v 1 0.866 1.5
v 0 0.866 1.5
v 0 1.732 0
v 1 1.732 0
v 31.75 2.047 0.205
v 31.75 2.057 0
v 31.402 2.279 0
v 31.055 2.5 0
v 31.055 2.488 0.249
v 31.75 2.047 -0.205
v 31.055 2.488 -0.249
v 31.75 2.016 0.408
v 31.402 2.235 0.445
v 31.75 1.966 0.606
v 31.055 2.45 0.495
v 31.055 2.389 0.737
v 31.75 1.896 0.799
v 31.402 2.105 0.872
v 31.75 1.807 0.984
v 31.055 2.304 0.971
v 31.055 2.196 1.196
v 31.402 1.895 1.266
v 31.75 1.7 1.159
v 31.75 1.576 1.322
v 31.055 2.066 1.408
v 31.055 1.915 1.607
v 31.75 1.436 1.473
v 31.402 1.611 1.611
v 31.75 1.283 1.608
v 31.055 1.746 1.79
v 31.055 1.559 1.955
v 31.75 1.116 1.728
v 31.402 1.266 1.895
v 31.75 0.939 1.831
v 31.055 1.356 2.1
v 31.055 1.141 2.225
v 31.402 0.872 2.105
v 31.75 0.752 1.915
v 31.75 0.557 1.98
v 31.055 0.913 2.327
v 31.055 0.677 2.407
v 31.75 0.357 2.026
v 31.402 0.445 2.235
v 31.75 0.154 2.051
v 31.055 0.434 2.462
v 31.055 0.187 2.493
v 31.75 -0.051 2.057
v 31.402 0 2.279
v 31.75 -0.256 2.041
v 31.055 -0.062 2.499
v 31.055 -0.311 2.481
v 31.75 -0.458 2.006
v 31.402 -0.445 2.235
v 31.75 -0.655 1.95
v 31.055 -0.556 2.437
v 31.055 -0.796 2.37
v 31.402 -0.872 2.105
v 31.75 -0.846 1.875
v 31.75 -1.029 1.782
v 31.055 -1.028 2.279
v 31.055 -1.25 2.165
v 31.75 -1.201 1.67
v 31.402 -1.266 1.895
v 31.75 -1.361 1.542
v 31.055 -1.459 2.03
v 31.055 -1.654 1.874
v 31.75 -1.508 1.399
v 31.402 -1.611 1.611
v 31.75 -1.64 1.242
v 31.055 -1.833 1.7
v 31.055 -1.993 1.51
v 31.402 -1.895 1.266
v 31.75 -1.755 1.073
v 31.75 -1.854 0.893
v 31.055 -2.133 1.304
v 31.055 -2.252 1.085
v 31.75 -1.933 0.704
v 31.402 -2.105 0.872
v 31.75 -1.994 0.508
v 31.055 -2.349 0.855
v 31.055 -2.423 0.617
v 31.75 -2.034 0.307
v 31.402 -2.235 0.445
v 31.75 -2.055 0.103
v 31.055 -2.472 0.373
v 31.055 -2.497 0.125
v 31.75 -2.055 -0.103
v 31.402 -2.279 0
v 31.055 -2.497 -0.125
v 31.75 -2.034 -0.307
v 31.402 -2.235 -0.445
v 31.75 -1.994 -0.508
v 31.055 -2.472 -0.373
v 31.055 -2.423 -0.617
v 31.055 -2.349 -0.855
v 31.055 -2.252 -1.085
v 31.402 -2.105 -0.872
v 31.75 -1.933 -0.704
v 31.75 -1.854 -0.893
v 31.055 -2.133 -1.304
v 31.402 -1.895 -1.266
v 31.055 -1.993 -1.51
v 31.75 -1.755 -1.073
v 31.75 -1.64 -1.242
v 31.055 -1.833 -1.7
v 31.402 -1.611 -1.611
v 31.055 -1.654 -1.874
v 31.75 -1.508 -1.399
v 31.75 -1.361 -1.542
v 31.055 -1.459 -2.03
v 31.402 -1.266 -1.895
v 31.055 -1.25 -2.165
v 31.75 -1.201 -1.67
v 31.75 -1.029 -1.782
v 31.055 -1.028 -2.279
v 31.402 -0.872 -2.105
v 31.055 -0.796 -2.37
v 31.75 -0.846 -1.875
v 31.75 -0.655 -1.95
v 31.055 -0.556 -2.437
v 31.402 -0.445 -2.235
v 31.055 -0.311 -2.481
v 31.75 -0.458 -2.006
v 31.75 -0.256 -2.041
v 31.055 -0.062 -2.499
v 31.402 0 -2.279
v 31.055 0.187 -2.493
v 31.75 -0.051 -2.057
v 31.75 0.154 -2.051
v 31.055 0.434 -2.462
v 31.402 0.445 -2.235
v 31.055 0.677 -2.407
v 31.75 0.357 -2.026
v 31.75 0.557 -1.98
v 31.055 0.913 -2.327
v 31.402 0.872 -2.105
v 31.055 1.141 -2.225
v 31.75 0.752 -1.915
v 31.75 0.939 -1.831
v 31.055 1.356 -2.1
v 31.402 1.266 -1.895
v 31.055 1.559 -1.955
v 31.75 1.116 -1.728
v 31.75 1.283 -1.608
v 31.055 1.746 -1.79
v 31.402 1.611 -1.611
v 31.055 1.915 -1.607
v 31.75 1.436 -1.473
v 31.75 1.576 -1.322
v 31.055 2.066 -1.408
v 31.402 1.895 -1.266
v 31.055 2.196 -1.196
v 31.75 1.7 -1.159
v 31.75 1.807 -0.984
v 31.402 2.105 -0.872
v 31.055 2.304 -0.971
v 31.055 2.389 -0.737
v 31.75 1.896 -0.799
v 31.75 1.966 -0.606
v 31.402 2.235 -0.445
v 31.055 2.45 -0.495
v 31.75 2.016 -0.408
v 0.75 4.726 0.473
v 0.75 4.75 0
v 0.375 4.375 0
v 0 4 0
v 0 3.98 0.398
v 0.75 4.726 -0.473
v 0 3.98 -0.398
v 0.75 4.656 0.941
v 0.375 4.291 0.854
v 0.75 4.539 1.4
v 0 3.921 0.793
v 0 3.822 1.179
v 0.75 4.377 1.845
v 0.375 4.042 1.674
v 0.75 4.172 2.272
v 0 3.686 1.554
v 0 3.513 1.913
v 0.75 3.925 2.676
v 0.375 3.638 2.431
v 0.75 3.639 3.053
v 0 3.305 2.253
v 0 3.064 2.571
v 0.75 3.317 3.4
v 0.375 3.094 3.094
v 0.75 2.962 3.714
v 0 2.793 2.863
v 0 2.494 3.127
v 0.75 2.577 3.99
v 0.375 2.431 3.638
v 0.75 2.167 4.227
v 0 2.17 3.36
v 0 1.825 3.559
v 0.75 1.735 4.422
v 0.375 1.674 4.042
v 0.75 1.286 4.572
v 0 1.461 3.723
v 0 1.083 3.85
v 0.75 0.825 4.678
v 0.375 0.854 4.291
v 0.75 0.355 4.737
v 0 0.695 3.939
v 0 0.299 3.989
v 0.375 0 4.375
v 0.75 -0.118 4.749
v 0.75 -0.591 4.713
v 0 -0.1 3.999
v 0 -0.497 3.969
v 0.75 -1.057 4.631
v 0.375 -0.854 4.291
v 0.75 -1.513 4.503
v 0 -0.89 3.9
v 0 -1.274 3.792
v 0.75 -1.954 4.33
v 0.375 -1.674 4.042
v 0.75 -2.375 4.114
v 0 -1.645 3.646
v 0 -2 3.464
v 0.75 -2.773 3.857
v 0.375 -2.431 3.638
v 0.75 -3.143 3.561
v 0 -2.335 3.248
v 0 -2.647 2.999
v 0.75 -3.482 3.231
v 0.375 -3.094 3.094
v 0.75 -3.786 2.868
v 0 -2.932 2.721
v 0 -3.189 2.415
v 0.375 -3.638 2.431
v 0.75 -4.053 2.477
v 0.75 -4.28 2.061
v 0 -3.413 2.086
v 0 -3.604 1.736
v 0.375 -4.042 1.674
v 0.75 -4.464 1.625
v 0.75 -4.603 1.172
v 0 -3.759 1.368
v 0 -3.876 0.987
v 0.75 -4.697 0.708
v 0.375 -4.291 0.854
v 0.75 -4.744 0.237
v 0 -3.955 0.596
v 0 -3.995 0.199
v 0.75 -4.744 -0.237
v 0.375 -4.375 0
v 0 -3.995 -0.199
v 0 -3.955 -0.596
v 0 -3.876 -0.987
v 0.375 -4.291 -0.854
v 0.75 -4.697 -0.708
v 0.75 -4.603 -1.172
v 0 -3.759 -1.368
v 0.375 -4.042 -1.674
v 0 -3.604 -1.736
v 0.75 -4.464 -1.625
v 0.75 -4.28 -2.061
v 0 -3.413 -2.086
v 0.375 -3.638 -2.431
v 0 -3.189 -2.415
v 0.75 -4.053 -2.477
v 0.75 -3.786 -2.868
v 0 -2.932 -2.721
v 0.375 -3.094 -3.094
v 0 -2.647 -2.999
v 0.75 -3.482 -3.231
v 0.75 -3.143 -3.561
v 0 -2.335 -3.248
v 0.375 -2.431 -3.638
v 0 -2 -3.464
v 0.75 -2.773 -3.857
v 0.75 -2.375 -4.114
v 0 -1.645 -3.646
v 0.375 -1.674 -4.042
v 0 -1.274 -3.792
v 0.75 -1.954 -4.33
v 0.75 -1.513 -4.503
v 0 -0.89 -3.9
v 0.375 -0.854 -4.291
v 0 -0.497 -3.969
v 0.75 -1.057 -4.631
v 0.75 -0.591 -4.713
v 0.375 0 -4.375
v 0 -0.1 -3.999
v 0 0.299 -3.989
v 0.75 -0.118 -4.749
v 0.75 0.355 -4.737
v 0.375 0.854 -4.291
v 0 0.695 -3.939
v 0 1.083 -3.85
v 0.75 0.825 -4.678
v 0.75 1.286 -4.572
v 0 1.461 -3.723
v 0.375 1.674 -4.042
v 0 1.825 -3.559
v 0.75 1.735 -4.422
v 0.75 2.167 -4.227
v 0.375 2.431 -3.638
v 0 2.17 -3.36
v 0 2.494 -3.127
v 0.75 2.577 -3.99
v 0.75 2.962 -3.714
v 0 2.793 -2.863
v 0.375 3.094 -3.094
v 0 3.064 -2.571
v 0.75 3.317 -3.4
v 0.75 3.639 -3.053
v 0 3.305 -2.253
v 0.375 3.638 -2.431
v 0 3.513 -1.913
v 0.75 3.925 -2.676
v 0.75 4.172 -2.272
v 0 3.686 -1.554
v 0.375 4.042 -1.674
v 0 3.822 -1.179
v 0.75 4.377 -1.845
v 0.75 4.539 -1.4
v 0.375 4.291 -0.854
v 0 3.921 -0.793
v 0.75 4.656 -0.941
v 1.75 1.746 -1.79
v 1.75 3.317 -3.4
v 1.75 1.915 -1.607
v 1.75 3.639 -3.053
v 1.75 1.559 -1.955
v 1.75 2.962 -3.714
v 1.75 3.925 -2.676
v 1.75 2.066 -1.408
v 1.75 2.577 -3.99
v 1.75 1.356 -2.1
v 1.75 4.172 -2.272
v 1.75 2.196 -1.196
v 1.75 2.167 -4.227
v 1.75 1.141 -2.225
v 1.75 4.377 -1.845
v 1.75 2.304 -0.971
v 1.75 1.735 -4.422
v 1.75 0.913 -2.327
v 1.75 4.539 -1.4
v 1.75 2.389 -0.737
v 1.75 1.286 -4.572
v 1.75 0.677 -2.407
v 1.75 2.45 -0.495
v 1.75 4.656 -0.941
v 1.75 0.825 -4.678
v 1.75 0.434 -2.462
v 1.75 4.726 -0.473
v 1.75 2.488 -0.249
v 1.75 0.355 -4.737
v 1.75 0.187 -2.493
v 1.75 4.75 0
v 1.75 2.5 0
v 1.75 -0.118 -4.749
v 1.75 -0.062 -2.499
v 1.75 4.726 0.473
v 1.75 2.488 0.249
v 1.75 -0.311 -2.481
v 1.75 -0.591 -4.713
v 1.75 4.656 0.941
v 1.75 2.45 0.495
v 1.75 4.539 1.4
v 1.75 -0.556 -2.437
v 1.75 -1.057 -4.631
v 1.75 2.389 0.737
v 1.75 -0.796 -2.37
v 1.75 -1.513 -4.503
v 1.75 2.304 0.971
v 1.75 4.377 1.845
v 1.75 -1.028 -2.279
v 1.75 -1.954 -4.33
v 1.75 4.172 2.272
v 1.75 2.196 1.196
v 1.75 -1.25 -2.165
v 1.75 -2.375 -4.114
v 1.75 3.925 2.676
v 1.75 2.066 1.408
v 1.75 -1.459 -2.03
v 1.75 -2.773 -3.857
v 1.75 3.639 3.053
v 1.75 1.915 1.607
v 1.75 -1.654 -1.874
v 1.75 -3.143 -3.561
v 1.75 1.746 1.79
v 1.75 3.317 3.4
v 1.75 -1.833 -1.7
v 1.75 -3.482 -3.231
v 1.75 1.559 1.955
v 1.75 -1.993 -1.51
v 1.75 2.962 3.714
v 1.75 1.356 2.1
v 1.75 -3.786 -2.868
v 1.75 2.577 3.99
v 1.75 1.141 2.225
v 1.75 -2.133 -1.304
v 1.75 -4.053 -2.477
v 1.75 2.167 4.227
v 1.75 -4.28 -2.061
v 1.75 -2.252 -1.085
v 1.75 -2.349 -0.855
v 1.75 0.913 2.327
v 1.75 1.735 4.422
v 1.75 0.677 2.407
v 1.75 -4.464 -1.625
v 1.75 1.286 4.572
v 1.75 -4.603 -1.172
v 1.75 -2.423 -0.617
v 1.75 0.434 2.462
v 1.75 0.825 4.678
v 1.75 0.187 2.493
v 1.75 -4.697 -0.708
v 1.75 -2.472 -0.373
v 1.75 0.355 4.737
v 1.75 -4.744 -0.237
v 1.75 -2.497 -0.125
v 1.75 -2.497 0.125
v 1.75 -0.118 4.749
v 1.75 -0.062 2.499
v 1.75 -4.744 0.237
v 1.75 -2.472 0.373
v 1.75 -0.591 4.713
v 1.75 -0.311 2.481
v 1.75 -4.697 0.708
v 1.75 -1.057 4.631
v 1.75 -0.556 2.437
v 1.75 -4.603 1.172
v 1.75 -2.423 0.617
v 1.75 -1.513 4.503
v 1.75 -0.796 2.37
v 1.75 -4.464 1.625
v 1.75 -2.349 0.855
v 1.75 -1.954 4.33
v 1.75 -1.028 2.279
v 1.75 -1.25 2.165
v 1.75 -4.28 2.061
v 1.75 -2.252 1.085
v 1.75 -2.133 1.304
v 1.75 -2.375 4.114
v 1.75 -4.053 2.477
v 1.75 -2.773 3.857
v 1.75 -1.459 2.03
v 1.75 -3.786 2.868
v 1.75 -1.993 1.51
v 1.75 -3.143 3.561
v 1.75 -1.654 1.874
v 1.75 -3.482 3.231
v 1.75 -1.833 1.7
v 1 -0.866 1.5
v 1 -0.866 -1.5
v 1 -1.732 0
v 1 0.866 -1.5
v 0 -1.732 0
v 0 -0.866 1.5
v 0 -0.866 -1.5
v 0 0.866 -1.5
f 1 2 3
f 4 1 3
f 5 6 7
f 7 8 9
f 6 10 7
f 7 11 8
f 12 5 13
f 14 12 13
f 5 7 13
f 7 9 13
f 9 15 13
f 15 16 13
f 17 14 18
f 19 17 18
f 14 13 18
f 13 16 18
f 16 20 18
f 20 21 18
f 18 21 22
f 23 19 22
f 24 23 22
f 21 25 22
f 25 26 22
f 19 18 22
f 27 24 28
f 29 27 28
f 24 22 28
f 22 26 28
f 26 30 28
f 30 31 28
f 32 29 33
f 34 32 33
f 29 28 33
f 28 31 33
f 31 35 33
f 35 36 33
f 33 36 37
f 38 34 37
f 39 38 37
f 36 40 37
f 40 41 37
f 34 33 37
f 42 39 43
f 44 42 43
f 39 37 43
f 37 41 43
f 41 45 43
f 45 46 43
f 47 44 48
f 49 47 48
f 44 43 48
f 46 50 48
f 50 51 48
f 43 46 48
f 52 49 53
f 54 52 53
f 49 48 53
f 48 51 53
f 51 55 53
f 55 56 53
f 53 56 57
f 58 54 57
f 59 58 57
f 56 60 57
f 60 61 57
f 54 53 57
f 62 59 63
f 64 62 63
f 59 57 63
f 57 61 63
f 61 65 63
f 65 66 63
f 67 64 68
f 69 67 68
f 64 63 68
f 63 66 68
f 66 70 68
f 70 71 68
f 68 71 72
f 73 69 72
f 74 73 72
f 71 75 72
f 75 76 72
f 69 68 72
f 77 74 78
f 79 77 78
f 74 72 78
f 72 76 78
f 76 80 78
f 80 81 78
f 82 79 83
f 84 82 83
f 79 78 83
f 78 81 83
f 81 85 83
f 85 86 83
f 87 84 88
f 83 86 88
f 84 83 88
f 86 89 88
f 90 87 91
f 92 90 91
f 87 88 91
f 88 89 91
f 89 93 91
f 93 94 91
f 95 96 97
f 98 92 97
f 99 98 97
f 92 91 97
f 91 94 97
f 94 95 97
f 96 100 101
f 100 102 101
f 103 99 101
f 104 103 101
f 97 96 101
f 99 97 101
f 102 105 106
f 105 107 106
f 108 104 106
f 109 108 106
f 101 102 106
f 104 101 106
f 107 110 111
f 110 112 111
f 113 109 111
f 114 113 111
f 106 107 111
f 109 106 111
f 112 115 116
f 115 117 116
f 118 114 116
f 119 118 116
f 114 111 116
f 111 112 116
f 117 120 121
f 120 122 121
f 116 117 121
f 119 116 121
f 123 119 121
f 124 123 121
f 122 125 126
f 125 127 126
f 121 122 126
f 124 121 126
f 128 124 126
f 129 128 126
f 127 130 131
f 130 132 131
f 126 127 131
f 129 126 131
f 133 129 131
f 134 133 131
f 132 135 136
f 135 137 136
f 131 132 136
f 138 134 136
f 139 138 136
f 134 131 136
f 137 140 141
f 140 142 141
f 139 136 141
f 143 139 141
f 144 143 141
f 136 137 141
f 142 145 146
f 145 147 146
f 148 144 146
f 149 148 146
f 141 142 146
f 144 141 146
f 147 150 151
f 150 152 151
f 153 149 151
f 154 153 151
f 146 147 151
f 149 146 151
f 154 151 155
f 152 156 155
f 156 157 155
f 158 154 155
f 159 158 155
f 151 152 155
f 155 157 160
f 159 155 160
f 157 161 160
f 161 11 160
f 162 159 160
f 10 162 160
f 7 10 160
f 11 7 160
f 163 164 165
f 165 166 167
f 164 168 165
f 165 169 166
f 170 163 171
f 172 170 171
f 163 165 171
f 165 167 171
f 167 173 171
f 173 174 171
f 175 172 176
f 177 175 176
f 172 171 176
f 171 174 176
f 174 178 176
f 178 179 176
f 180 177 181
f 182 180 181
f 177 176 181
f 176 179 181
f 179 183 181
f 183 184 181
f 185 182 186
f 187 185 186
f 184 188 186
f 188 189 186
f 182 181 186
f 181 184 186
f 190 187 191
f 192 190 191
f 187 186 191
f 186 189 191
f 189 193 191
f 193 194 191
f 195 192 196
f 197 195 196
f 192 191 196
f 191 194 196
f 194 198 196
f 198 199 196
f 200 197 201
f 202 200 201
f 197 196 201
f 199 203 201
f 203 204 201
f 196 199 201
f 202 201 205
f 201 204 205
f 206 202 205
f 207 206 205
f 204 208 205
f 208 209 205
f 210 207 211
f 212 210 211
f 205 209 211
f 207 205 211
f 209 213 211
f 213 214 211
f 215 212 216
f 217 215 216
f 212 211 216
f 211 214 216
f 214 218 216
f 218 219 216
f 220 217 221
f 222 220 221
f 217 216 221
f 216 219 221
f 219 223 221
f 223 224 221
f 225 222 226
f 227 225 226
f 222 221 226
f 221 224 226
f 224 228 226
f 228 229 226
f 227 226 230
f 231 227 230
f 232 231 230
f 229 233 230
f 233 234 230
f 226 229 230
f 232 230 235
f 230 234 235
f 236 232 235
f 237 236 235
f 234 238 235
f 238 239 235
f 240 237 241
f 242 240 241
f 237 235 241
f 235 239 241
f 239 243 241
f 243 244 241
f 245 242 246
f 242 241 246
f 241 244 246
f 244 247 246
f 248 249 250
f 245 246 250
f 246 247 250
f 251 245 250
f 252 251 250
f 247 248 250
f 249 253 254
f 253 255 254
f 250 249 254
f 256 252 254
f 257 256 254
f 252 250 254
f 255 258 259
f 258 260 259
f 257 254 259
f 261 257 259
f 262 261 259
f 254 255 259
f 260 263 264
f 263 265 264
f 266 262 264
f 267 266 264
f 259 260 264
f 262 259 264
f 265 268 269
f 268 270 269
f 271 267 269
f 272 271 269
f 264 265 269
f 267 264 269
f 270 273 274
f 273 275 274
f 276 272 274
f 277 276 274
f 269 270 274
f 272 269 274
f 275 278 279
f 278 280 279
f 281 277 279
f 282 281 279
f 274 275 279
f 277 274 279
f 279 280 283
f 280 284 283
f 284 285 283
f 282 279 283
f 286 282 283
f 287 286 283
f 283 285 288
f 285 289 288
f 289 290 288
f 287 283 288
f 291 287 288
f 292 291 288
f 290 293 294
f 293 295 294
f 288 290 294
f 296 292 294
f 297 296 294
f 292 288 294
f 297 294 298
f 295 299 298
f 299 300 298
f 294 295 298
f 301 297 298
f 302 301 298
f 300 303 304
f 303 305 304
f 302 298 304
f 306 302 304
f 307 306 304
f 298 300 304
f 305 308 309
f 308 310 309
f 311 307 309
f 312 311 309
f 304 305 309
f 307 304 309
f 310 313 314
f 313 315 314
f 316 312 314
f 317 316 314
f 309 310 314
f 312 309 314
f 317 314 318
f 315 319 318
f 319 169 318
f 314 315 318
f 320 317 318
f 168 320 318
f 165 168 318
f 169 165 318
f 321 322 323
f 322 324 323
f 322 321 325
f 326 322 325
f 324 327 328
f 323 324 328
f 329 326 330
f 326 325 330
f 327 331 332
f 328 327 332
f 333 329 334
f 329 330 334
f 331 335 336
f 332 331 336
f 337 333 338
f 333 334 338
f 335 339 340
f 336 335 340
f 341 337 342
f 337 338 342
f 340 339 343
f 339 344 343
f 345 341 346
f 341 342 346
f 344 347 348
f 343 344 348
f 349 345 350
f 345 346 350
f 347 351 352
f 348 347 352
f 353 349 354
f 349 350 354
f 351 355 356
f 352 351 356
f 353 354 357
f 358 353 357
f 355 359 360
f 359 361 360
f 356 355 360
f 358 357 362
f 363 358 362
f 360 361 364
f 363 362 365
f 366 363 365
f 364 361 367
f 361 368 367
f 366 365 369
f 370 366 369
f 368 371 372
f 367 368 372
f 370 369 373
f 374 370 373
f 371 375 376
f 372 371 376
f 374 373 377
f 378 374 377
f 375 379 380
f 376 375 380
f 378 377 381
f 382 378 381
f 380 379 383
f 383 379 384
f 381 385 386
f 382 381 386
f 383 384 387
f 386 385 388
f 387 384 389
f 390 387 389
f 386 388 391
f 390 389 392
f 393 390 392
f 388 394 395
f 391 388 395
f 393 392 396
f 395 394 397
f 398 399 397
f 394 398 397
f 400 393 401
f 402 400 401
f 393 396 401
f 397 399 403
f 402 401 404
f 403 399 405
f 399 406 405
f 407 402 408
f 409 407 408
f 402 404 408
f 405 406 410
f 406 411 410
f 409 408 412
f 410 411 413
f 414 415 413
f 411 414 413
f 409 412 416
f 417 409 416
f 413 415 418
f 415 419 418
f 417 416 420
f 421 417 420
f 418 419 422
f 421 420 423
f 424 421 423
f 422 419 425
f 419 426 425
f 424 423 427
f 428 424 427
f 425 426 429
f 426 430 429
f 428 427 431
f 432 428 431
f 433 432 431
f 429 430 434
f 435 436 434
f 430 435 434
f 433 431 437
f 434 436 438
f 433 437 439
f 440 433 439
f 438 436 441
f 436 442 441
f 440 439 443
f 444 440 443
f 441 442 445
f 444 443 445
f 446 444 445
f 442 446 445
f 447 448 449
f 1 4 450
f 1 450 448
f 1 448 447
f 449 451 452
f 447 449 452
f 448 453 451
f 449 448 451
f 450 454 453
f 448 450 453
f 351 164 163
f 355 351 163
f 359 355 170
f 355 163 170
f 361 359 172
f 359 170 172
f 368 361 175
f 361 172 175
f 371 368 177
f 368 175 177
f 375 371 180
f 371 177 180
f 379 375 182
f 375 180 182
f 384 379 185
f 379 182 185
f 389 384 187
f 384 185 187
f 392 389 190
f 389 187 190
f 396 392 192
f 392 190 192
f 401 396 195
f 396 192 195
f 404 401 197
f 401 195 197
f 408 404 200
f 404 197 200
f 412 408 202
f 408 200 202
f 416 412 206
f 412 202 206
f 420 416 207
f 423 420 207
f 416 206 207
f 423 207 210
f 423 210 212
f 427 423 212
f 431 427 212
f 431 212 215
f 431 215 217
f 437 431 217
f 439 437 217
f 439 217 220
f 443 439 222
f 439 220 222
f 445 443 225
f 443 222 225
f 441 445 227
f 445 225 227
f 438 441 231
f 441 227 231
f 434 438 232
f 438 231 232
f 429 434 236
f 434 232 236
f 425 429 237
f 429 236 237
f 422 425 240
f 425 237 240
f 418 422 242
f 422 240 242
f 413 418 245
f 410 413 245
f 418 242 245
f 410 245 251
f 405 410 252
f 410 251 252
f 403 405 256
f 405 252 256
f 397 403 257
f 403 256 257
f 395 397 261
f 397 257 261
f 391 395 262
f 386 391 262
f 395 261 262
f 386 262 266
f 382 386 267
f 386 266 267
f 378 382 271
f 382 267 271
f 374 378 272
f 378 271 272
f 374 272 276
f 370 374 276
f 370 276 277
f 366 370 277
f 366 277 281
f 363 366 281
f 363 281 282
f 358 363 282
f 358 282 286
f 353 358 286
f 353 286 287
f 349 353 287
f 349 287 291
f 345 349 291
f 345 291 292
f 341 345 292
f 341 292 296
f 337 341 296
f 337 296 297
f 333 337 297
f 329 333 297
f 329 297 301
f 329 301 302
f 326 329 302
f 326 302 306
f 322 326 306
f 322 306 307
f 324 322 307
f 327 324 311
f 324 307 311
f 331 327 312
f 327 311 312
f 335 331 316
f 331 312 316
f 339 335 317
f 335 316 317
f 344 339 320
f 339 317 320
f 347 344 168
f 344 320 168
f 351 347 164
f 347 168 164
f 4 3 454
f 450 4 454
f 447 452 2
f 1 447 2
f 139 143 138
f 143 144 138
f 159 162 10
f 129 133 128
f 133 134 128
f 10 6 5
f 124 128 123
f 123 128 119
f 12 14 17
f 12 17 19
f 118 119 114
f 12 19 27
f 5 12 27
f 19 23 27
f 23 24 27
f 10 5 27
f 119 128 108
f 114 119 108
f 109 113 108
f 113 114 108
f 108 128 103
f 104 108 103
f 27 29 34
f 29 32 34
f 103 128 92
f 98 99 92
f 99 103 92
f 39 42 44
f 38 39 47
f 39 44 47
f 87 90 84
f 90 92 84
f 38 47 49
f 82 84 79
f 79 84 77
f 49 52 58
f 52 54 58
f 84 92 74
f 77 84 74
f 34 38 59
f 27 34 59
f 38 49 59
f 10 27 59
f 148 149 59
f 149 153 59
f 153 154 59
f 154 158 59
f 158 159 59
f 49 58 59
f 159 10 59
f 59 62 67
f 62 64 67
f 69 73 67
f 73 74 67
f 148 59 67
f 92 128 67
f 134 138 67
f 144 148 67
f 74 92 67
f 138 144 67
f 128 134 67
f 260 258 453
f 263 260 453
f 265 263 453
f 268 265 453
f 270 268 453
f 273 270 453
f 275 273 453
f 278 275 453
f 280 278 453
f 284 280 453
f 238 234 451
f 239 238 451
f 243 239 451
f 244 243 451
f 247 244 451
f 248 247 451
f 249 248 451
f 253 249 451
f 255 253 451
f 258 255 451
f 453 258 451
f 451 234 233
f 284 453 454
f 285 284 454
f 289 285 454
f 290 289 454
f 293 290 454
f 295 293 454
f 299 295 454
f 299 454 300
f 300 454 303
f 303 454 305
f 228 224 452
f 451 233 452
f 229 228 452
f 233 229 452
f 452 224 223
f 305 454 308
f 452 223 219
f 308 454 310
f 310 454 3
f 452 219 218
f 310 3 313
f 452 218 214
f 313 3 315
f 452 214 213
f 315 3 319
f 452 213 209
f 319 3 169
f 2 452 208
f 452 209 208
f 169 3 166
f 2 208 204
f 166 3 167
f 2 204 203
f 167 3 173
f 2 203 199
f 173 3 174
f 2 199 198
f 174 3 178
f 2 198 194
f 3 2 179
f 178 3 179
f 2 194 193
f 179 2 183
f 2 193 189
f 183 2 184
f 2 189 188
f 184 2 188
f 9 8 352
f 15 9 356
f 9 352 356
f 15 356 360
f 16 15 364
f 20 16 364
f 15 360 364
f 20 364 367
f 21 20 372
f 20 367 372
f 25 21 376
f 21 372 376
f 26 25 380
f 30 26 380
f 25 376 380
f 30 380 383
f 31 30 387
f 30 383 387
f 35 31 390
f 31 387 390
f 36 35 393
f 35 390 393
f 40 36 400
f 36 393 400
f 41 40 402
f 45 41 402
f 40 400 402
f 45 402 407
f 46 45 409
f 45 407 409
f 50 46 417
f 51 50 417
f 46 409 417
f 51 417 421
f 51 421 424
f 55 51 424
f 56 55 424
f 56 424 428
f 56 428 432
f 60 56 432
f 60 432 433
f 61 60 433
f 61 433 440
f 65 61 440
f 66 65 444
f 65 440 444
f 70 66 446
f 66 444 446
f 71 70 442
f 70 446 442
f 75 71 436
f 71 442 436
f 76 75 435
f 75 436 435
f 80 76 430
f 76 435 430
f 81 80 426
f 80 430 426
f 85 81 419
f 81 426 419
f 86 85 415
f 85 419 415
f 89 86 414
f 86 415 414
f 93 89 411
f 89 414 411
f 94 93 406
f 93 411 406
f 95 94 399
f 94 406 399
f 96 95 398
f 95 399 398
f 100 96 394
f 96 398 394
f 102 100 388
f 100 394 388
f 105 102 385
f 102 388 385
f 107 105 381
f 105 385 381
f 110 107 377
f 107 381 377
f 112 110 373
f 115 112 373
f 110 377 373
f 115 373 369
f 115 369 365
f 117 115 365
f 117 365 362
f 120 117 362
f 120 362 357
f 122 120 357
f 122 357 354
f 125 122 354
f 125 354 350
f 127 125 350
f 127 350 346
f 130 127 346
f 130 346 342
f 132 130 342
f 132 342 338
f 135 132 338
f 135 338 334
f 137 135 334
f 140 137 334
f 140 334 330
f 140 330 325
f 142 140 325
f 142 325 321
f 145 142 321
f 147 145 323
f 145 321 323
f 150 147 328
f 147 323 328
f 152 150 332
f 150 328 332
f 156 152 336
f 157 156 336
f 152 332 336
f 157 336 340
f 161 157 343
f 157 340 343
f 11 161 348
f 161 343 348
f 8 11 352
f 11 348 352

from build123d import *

# Parameters (mm, degrees)
CUT_EXTRUDE1_DEPTH = 1
CHAMFER1_SIZE      = 0.75


with BuildPart() as part:
    # Sketch1 → Revolve1 (revolve)
    with BuildSketch(Plane.XY):
        Polygon((31.75, 0), (31.75, 2.057236169), (31.055, 2.5), (1.75, 2.5), (1.75, 4.75), (0, 4.75), (0, 0), align=None)
    revolve(axis=Axis((0, 0, 0), (1, 0, 0)))

    # Sketch5 → Cut-Extrude1 (cut)
    with BuildSketch(Plane.ZY):
        Polygon((1.5, -0.866025404), (1.5, 0.866025404), (0, 1.732050808), (-1.5, 0.866025404), (-1.5, -0.866025404), (0, -1.732050808), align=None)
    extrude(amount=-CUT_EXTRUDE1_DEPTH, mode=Mode.SUBTRACT)

    # Chamfer1
    chamfer1_edges = [part.edges().sort_by_distance(p)[0] for p in [
        (0, -4.75, 0),
    ]]
    chamfer(chamfer1_edges, length=CHAMFER1_SIZE)


solid = part.part
